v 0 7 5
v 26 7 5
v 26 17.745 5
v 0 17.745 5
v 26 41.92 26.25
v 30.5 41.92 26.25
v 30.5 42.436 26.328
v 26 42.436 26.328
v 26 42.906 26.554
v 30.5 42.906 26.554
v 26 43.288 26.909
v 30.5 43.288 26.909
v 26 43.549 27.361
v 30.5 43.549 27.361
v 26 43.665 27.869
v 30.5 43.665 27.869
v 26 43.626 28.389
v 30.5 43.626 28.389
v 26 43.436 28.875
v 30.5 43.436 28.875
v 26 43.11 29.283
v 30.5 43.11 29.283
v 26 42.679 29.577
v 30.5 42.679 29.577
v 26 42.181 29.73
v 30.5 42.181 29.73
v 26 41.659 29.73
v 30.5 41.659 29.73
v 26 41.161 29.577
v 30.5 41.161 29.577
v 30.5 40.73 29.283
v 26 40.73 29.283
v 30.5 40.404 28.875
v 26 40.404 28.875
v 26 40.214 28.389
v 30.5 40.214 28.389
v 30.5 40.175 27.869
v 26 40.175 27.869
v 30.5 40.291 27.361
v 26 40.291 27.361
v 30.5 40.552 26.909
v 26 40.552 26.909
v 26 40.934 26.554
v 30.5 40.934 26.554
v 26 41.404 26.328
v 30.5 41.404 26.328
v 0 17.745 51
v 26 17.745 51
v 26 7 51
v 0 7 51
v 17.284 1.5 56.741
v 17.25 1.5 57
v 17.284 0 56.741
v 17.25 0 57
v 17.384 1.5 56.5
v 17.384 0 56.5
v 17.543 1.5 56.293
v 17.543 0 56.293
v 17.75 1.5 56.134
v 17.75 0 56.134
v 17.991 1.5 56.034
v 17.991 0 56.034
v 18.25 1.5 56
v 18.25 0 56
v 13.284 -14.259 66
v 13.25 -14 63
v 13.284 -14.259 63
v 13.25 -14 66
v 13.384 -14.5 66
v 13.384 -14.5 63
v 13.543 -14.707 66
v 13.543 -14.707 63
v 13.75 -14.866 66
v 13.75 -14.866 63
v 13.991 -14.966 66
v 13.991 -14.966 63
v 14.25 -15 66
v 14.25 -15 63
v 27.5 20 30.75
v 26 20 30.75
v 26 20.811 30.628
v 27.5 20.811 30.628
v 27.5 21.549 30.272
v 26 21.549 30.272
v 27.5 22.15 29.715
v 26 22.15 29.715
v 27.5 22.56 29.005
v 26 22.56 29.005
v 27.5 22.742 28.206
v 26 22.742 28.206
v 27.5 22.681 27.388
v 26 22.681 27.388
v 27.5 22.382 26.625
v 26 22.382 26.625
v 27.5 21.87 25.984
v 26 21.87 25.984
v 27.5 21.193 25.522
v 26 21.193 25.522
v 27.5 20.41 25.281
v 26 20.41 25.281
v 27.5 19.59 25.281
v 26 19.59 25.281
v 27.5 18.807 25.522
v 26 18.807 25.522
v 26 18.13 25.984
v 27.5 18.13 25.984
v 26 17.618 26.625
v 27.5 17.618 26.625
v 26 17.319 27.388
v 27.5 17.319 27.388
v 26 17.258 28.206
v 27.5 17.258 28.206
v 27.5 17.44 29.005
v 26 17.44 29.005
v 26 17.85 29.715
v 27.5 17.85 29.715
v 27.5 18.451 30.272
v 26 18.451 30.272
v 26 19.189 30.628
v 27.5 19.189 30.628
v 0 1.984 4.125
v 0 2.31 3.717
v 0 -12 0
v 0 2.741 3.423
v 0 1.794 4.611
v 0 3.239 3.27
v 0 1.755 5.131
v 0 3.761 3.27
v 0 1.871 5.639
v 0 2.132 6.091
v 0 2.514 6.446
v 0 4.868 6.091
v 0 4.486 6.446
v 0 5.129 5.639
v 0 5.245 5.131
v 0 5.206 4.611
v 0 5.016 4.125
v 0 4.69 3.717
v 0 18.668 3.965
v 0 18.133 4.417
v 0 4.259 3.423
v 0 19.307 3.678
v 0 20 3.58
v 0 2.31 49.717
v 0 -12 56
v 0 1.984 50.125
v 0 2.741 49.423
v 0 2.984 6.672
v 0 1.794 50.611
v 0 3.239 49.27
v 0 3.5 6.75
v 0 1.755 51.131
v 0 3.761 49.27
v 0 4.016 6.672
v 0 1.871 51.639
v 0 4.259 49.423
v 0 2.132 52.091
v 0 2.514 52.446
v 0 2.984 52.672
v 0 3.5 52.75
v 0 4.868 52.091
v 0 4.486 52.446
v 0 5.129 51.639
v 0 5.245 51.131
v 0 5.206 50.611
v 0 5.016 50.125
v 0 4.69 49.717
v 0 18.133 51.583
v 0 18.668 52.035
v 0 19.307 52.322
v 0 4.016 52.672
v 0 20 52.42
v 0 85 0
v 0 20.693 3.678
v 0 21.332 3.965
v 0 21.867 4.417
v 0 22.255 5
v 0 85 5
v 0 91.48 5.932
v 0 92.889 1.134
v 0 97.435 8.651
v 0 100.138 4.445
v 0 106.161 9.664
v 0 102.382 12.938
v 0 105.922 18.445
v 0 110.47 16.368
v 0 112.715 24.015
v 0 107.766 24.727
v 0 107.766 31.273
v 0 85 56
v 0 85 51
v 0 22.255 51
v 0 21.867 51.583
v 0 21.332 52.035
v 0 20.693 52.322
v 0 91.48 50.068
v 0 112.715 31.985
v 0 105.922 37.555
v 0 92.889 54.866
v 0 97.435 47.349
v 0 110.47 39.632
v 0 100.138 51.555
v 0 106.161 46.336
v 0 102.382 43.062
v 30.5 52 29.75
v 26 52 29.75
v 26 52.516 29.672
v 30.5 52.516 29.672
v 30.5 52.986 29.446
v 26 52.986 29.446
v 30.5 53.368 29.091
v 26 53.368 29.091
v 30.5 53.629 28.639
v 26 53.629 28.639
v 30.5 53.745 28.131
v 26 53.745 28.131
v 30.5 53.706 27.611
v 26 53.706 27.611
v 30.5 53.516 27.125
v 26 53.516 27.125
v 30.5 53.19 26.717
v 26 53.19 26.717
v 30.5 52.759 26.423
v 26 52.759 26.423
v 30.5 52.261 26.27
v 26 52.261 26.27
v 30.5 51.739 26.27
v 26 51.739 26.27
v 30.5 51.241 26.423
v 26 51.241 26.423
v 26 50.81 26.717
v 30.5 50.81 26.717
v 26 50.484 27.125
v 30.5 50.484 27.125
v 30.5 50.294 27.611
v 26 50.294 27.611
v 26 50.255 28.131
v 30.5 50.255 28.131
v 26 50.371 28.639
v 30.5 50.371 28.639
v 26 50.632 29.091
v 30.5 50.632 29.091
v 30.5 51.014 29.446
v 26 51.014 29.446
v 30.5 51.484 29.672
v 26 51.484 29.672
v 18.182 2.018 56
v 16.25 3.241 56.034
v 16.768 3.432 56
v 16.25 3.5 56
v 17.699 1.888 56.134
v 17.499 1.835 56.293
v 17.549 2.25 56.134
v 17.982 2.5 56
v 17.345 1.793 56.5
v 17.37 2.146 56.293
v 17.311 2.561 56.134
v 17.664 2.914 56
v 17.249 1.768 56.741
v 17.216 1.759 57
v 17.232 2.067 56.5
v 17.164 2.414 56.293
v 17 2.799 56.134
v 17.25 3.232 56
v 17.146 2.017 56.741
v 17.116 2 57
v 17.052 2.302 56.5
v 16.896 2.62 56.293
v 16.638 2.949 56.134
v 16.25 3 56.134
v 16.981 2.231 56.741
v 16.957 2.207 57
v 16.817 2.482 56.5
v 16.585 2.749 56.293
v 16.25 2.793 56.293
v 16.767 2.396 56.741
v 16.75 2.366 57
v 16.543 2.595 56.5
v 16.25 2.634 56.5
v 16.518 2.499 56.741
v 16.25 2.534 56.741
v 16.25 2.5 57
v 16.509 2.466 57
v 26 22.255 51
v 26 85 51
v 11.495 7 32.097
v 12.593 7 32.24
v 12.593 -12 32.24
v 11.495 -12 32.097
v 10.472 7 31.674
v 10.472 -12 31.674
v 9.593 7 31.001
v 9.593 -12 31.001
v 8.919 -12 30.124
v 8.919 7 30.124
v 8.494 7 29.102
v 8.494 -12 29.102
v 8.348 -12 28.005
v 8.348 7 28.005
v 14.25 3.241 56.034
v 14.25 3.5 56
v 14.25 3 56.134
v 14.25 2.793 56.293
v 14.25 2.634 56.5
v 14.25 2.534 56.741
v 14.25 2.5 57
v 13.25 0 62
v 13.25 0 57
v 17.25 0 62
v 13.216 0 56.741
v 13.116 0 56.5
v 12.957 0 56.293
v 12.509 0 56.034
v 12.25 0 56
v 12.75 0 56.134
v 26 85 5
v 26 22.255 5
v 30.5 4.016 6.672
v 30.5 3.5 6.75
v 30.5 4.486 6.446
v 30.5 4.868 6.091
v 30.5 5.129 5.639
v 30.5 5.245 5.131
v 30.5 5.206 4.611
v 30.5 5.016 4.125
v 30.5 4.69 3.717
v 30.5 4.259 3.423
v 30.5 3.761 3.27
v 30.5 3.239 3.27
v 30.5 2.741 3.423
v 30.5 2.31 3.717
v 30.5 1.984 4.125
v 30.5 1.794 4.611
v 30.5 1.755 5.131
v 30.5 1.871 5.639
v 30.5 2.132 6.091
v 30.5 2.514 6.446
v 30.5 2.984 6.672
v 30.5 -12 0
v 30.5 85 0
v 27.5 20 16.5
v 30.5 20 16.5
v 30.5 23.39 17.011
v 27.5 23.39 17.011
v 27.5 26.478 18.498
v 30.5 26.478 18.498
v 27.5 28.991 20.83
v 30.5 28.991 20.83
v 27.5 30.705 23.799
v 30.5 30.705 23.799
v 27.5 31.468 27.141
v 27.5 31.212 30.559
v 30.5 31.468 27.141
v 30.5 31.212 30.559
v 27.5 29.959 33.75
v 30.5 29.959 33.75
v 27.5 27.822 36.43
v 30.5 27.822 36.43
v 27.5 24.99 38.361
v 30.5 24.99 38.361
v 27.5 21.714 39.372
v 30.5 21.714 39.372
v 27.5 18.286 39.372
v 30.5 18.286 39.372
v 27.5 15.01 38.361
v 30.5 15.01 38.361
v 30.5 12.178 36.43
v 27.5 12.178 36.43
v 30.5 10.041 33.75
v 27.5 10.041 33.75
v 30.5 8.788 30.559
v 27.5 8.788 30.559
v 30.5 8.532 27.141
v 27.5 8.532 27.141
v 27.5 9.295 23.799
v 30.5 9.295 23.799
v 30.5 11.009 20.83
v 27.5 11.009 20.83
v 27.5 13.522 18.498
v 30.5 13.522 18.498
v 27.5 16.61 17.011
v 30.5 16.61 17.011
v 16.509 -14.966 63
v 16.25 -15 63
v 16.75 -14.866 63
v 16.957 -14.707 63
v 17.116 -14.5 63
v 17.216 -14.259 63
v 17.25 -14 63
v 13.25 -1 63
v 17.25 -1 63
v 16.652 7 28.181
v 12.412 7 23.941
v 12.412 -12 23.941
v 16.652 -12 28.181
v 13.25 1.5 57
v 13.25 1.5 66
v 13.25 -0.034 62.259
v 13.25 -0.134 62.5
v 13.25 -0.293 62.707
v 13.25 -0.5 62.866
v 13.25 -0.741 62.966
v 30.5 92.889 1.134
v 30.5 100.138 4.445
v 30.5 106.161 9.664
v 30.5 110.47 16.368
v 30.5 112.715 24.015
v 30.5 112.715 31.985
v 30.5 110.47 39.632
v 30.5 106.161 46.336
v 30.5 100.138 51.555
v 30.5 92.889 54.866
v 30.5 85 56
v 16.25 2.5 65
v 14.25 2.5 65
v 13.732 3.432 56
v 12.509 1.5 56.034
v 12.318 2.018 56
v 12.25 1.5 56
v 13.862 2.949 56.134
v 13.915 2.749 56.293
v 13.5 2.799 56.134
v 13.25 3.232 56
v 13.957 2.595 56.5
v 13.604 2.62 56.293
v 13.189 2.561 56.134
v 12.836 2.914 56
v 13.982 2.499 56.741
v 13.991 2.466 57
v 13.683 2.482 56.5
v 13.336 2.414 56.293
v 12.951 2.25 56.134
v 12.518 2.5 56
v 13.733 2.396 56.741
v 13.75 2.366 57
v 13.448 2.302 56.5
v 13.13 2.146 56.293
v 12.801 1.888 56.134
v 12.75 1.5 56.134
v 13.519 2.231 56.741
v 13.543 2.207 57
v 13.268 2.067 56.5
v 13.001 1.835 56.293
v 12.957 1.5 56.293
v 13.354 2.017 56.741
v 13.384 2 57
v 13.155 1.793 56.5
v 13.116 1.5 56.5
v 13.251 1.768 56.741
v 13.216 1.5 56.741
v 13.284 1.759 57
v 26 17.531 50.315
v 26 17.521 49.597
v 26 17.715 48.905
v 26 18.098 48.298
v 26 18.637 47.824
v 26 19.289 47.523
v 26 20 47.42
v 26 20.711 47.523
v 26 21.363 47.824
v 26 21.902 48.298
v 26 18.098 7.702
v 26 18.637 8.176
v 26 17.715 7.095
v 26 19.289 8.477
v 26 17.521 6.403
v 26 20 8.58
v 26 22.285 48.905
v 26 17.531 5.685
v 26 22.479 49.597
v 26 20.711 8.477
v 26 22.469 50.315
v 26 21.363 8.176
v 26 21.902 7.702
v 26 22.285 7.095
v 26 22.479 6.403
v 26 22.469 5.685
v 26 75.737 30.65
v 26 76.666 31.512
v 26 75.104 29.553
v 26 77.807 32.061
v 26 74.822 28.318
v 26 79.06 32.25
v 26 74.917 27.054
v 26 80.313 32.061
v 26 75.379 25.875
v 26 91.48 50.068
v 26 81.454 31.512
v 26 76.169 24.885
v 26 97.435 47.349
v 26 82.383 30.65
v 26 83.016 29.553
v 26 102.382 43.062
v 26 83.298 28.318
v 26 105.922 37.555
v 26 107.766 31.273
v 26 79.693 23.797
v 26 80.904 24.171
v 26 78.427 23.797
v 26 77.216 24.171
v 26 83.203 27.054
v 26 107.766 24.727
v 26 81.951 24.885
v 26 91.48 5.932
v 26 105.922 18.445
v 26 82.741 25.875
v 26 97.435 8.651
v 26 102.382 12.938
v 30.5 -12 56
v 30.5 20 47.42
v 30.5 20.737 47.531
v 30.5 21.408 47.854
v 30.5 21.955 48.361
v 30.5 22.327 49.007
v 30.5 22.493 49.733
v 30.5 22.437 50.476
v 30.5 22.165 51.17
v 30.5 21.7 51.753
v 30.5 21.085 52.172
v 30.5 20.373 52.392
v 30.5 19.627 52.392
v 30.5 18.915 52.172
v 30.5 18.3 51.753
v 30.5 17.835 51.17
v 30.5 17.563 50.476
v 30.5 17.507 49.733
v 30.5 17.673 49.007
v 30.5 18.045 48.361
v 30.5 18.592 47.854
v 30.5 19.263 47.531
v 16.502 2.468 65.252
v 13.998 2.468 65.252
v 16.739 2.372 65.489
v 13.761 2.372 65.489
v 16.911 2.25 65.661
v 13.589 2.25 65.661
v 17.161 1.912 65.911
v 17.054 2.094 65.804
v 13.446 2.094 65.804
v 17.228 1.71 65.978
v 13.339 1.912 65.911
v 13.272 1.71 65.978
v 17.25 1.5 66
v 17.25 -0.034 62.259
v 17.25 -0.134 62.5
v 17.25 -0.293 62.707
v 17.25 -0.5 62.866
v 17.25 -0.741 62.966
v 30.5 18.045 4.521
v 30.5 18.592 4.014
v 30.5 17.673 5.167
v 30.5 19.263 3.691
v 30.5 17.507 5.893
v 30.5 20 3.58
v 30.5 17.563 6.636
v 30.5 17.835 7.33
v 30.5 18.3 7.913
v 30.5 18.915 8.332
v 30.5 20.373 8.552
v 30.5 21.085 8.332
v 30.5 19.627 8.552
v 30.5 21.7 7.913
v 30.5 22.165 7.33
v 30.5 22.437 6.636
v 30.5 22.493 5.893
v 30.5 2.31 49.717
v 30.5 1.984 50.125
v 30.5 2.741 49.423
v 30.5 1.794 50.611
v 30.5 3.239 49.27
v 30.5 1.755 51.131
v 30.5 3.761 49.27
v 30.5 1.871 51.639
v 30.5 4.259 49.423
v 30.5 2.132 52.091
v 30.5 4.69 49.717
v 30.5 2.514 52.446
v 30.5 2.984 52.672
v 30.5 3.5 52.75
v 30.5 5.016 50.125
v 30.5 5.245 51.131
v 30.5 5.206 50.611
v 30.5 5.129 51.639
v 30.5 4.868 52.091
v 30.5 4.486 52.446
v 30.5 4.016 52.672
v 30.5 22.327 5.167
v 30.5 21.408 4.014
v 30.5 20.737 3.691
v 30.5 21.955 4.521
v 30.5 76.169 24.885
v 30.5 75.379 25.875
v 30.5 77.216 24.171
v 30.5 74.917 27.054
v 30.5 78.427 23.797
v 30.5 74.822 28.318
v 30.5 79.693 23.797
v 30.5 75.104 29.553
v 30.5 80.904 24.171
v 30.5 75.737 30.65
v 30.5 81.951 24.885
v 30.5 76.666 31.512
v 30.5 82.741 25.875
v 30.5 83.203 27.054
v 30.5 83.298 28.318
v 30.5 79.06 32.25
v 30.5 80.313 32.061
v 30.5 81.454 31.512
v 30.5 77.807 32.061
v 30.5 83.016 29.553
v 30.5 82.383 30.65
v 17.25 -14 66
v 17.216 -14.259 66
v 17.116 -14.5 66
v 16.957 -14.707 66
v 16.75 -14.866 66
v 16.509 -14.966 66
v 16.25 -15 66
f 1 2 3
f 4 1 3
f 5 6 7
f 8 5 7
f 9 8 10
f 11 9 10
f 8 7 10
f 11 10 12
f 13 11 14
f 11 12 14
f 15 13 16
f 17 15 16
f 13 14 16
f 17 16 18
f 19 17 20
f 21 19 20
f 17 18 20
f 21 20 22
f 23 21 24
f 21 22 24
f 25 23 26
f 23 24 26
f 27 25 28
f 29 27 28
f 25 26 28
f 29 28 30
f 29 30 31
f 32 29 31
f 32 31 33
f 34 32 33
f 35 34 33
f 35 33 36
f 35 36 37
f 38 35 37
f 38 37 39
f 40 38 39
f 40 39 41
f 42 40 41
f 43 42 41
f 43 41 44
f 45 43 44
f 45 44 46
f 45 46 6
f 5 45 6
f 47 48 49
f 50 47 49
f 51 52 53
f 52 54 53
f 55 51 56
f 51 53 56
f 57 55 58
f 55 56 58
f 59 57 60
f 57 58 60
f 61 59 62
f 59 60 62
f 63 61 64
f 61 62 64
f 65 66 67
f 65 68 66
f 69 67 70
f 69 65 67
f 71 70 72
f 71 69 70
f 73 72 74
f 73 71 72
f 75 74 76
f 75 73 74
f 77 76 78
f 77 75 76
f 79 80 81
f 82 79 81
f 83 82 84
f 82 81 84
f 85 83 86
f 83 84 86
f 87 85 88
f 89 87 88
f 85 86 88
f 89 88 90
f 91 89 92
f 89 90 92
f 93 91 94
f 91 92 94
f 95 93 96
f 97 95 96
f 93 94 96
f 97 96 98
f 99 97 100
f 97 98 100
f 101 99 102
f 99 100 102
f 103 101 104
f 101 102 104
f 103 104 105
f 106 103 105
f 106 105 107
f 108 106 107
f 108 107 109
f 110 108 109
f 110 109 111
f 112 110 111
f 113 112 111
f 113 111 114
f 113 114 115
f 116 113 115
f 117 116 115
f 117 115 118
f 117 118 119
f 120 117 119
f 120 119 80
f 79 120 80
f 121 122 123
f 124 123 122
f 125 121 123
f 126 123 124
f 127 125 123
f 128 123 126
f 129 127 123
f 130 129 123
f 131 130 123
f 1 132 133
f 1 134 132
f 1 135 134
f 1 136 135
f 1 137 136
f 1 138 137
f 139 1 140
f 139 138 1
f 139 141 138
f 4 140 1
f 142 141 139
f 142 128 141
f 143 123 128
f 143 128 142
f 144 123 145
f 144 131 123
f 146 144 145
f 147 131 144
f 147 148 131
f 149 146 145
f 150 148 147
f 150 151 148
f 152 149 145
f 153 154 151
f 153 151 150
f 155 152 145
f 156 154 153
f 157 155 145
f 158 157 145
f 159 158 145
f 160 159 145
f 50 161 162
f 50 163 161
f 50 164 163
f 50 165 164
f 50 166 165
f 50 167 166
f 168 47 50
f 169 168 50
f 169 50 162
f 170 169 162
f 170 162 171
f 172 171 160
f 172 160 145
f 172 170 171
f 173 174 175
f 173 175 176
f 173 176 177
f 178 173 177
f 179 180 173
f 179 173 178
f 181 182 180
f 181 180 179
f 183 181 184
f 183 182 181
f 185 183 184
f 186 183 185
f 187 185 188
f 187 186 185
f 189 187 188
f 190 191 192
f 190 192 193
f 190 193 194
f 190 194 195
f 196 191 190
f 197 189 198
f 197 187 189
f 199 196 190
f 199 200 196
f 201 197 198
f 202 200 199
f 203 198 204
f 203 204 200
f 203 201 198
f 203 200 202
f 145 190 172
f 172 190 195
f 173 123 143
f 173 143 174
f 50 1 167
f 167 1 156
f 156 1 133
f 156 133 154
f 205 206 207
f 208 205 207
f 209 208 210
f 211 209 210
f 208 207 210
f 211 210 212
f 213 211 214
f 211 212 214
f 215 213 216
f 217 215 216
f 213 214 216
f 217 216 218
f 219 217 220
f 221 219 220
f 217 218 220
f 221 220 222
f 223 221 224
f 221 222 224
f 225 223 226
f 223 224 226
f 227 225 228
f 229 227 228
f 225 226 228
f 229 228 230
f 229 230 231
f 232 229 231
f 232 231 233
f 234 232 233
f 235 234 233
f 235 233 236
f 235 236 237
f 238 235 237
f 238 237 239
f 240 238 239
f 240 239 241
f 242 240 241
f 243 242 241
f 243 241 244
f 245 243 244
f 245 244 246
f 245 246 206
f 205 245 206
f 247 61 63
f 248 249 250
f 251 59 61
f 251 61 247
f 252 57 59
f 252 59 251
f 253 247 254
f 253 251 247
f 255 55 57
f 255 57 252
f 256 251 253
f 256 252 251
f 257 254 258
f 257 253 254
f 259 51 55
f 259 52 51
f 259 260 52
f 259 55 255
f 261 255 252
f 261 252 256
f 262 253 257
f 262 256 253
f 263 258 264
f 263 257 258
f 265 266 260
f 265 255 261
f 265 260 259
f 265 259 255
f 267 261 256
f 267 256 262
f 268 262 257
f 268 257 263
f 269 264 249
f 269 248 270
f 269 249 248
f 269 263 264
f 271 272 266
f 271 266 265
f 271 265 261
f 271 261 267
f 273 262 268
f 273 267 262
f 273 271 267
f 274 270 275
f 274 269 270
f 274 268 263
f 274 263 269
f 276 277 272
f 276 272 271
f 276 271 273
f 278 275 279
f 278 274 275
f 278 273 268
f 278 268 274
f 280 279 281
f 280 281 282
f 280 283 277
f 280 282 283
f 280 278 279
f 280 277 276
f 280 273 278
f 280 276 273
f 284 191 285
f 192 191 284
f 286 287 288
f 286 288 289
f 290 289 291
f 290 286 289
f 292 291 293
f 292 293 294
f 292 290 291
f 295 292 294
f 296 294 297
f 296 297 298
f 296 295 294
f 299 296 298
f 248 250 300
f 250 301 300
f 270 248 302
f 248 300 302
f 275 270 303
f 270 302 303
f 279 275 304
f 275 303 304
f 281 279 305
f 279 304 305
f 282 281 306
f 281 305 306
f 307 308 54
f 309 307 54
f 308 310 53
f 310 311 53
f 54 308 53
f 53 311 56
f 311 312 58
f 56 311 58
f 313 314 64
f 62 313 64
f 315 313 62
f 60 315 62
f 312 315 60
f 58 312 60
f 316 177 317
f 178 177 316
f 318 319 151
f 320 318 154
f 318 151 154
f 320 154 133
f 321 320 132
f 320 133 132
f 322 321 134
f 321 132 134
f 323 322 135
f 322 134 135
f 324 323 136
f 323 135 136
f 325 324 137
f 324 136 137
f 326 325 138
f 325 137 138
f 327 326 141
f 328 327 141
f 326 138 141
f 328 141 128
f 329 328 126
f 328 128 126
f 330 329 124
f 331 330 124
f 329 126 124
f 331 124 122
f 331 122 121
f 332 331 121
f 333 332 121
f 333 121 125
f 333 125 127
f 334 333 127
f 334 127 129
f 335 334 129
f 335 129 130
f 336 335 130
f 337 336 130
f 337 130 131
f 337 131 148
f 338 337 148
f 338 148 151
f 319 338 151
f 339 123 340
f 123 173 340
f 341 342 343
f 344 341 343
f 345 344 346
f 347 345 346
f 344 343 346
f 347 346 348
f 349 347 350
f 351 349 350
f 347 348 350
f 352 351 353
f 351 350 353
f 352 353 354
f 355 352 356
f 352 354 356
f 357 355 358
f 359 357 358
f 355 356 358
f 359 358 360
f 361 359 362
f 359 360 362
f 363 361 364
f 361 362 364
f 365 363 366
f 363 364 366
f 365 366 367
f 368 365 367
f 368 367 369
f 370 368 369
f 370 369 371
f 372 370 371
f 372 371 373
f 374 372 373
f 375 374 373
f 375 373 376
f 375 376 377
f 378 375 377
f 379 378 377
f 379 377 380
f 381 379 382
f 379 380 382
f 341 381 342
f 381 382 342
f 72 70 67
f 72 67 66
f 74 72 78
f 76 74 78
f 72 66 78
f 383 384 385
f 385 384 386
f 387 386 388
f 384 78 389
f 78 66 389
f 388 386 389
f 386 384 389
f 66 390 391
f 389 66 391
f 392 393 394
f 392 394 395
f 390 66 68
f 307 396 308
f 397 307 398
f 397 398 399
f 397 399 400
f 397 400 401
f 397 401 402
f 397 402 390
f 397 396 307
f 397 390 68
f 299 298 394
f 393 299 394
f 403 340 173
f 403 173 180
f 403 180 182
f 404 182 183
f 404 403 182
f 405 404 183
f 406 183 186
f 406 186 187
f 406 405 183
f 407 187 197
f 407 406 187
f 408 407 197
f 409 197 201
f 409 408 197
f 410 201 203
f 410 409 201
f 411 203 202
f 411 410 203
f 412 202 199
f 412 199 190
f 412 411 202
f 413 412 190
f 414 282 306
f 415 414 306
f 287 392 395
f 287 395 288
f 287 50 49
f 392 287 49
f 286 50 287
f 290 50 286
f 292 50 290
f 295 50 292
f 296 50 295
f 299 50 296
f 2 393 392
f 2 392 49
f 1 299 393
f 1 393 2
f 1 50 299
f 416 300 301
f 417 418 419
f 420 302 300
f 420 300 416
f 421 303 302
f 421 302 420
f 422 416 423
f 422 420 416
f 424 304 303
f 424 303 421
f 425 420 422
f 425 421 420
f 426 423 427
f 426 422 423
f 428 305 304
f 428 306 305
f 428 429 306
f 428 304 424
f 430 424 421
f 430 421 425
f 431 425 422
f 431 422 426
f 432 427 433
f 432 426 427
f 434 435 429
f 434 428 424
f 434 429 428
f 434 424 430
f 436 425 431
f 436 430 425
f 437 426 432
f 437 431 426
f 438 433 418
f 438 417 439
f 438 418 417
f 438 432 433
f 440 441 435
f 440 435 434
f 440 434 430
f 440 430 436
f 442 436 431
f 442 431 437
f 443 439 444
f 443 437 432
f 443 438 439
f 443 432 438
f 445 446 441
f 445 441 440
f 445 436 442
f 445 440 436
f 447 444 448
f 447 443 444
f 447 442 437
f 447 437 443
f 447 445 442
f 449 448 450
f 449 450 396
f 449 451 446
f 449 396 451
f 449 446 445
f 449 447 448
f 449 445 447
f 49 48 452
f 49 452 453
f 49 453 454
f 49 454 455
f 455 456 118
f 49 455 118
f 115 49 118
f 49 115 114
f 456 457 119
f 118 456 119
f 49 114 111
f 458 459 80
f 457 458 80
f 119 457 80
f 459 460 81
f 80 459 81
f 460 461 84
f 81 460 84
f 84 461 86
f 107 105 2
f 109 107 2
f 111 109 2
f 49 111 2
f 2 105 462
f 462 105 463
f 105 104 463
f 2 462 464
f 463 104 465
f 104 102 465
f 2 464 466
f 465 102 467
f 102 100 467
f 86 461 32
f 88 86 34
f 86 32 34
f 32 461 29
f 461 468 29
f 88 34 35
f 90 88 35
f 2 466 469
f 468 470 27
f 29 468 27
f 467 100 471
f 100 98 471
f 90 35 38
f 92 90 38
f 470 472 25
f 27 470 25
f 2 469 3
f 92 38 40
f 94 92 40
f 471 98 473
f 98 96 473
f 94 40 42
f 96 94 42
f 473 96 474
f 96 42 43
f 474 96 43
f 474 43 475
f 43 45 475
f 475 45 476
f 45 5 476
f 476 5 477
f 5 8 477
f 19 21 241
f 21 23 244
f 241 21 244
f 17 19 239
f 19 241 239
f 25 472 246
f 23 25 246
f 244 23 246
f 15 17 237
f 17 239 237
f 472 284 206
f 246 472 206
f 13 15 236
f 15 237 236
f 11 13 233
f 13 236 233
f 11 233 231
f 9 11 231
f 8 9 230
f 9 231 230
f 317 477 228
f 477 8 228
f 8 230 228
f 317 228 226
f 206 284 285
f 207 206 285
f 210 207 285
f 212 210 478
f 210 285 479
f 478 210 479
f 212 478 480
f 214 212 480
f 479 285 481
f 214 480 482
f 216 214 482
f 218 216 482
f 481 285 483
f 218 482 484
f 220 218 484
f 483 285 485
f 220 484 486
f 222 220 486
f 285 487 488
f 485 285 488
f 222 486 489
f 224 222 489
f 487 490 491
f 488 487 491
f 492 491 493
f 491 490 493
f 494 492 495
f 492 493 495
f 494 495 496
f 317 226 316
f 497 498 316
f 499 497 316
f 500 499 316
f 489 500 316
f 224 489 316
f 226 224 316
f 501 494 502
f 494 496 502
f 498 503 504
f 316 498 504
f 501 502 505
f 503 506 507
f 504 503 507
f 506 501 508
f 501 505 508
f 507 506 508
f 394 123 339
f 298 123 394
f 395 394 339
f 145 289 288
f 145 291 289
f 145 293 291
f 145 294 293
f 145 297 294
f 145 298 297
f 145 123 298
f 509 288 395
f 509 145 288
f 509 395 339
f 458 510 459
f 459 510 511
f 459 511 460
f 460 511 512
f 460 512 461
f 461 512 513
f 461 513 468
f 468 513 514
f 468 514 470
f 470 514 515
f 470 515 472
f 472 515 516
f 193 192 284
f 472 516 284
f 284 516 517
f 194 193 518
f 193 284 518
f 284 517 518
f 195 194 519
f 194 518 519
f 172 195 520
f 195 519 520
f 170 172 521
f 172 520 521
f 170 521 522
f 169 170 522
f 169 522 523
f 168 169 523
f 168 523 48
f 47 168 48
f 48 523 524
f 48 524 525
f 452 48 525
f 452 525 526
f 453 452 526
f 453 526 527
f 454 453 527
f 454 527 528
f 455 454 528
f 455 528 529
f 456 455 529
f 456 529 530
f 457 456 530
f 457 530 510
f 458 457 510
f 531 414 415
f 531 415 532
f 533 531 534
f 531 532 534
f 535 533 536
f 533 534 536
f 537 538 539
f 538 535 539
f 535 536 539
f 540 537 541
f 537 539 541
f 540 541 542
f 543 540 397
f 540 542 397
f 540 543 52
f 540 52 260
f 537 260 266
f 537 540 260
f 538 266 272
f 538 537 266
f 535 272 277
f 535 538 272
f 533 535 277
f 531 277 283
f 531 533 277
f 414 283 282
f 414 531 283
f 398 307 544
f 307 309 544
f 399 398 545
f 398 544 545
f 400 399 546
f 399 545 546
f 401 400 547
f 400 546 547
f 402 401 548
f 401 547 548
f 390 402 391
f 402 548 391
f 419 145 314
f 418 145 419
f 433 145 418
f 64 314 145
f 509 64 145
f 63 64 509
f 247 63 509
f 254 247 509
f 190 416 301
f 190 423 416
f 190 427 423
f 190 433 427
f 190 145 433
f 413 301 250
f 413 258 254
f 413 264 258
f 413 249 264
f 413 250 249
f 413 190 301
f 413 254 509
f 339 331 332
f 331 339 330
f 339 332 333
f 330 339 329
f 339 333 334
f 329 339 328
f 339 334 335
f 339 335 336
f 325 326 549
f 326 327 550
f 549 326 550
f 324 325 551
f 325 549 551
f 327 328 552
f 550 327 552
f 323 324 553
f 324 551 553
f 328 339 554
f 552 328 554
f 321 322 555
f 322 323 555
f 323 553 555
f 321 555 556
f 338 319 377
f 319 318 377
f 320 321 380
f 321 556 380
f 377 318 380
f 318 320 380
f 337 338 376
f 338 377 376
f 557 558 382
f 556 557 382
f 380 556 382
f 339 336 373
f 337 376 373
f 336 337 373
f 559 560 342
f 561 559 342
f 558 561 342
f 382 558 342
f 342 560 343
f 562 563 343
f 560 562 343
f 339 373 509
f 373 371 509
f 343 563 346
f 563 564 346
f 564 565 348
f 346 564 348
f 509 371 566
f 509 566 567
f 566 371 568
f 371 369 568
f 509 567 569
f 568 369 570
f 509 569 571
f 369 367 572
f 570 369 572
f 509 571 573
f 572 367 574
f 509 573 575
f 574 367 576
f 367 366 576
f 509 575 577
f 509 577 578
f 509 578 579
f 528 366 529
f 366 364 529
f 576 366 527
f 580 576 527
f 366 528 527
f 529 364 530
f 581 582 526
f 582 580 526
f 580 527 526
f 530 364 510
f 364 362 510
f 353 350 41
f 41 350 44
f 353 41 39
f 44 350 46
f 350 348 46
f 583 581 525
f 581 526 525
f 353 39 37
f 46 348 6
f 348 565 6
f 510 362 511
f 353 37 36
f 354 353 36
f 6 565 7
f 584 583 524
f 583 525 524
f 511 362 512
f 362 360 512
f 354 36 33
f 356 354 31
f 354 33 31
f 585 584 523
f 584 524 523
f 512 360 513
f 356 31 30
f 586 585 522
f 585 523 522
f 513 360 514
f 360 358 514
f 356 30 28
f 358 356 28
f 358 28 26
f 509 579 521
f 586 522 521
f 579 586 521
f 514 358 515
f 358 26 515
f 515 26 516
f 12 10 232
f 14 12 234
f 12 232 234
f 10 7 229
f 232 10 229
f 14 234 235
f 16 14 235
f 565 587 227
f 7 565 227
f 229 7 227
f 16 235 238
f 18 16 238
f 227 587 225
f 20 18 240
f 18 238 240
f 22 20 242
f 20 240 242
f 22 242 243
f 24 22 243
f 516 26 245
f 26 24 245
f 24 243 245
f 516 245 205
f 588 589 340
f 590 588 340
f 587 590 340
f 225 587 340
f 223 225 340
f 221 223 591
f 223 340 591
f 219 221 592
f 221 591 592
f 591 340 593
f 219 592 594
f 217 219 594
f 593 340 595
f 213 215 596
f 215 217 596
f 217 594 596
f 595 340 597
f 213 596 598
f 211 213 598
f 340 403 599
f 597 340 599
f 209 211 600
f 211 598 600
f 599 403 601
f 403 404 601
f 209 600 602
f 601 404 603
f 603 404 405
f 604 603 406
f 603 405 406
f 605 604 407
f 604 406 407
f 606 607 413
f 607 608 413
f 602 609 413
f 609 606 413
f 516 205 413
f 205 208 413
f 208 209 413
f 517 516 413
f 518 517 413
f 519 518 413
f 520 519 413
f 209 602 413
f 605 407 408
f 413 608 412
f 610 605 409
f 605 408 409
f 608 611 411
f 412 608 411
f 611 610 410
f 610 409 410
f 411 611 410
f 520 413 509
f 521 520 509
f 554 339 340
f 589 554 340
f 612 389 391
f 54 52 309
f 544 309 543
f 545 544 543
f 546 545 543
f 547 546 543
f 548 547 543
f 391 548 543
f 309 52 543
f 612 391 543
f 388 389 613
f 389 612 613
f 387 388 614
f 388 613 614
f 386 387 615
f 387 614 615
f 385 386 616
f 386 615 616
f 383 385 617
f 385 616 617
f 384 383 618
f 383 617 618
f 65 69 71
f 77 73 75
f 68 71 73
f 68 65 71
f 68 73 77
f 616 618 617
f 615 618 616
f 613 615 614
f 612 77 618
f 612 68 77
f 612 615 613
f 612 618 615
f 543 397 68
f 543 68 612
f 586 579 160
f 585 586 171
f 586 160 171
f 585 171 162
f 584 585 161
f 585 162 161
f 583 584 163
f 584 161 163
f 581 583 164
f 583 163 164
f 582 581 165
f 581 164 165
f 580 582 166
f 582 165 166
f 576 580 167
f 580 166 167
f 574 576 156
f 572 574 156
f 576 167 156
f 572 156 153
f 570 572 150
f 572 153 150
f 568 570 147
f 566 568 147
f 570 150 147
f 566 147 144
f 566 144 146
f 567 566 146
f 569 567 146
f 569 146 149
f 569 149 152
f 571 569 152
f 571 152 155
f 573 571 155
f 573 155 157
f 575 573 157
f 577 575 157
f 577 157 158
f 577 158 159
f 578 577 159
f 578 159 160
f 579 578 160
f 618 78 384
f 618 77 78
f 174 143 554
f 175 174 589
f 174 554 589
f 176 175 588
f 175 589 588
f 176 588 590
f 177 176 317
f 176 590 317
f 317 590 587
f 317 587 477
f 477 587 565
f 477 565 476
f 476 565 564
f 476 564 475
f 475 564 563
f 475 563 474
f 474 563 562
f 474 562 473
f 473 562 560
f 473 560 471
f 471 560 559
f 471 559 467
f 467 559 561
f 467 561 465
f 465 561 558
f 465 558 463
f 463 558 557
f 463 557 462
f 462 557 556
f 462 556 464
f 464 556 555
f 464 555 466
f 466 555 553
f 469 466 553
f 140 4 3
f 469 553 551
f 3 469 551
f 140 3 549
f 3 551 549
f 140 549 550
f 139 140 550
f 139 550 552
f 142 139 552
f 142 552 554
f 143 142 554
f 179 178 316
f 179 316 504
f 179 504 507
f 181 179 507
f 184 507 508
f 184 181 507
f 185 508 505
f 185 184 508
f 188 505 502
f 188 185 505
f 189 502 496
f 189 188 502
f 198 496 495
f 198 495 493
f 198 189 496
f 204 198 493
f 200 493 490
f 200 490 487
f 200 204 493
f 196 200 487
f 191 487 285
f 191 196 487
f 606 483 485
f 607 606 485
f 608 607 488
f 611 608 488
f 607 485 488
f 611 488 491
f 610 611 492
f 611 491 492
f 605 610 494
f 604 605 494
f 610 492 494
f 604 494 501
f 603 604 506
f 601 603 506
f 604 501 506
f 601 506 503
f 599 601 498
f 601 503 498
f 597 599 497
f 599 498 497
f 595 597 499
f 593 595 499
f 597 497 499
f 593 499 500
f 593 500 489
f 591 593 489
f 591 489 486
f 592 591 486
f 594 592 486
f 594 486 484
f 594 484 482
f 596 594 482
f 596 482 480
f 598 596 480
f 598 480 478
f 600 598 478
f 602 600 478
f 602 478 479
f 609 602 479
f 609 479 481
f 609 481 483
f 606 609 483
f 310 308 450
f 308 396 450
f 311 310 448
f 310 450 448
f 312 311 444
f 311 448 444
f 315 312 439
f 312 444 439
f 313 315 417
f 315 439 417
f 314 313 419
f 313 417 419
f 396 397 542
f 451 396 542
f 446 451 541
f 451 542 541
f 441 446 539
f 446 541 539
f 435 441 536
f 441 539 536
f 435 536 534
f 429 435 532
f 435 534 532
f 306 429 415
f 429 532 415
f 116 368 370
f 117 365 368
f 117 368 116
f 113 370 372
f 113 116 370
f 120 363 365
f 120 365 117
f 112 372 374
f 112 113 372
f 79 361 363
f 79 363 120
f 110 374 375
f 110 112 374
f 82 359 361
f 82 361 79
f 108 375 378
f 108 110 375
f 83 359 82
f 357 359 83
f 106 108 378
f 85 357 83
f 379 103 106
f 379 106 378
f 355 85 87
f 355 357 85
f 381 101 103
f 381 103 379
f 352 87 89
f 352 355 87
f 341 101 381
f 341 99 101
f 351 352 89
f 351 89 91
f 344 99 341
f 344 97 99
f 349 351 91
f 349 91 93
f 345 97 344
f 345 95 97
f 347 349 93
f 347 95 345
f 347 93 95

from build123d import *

# Parameters (mm, degrees)
SKETCH2_W           = 30.5
SKETCH2_H           = 56
BOSS_EXTRUDE3_DEPTH = 85
BOSS_EXTRUDE4_DEPTH = 30.5
CUT_EXTRUDE2_DEPTH  = 26
SKETCH5_R           = 2.75
SKETCH5_R_2         = 4.25
SKETCH5_R_3         = 1.75
CUT_EXTRUDE3_DEPTH  = 10
SKETCH7_R           = 11.5
CUT_EXTRUDE5_DEPTH  = 3
SKETCH9_R           = 1.75
CUT_EXTRUDE7_DEPTH  = 77
SKETCH6_R           = 2.5
SKETCH6_R_2         = 1.75
CUT_EXTRUDE8_DEPTH  = 77
BOSS_EXTRUDE5_DEPTH = 10
SKETCH12_W          = 4
SKETCH12_H          = 3
BOSS_EXTRUDE6_DEPTH = 15
FILLET2_R           = 1
SKETCH13_W          = 30.5
SKETCH13_H          = 56
BOSS_EXTRUDE7_DEPTH = 12
CUT_EXTRUDE9_DEPTH  = 22


with BuildPart() as part:
    # Sketch2 → Boss-Extrude3 (new body)
    with BuildSketch(Plane(origin=(0, 0, 0), x_dir=(1, 0, 0), z_dir=(0, 1, 0))):
        with Locations((15.25, -28)):
            Rectangle(SKETCH2_W, SKETCH2_H)
    extrude(amount=BOSS_EXTRUDE3_DEPTH)

    # Sketch4 → Boss-Extrude4 (add)
    with BuildSketch(Plane(origin=(30.5, 0, 0), x_dir=(0, 0, -1), z_dir=(1, 0, 0))):
        with BuildLine():
            Line((-56, 85), (0, 85))
            ThreePointArc((0, 85), (-28, 113), (-56, 85))
        make_face()
    extrude(amount=-BOSS_EXTRUDE4_DEPTH)

    # Sketch3 → Cut-Extrude2 (cut)
    with BuildSketch(Plane.ZY):
        with BuildLine():
            Line((5, 10), (5, 80))
            Line((5, 80), (5, 85))
            ThreePointArc((5, 85), (28, 108), (51, 85))
            Line((51, 85), (51, 80))
            Line((51, 80), (51, 10))
            Line((51, 10), (51, 7))
            Line((51, 7), (5, 7))
            Line((5, 7), (5, 10))
        make_face()
    extrude(amount=-CUT_EXTRUDE2_DEPTH, mode=Mode.SUBTRACT)

    # Sketch5 → Cut-Extrude3 (cut)
    with BuildSketch(Plane.ZY.offset(-26)):
        with Locations((28, 20)):
            Circle(SKETCH5_R)
        with Locations((28, 79.06)):
            Circle(SKETCH5_R_2)
        with Locations((28, 52)):
            Circle(SKETCH5_R_3)
    extrude(amount=-CUT_EXTRUDE3_DEPTH, mode=Mode.SUBTRACT)

    # Sketch7 → Cut-Extrude5 (cut)
    with BuildSketch(Plane(origin=(30.5, 0, 0), x_dir=(0, 0, -1), z_dir=(1, 0, 0))):
        with Locations((-28, 20)):
            Circle(SKETCH7_R)
    extrude(amount=-CUT_EXTRUDE5_DEPTH, mode=Mode.SUBTRACT)

    # Sketch9 → Cut-Extrude7 (cut)
    with BuildSketch(Plane.ZY):
        with Locations((5, 3.5)):
            Circle(SKETCH9_R)
        with Locations((51, 3.5)):
            Circle(SKETCH9_R)
    extrude(amount=-CUT_EXTRUDE7_DEPTH, mode=Mode.SUBTRACT)

    # Sketch6 → Cut-Extrude8 (cut)
    with BuildSketch(Plane(origin=(30.5, 0, 0), x_dir=(0, 0, -1), z_dir=(1, 0, 0))):
        with Locations((-49.92, 20)):
            Circle(SKETCH6_R)
        with Locations((-6.08, 20)):
            Circle(SKETCH6_R)
        with Locations((-28, 41.92)):
            Circle(SKETCH6_R_2)
    extrude(amount=-CUT_EXTRUDE8_DEPTH, mode=Mode.SUBTRACT)

    # Sketch11 → Boss-Extrude5 (add)
    with BuildSketch(Plane.XY.offset(56)):
        Polygon((15.25, 2.5), (17.25, 2.5), (17.25, 0), (15.25, 0), (13.25, 0), (13.25, 2.5), align=None)
    extrude(amount=BOSS_EXTRUDE5_DEPTH)

    # Sketch12 → Boss-Extrude6 (add)
    with BuildSketch(Plane.XZ):
        with Locations((15.25, 64.5)):
            Rectangle(SKETCH12_W, SKETCH12_H)
    extrude(amount=BOSS_EXTRUDE6_DEPTH)

    # Fillet2
    fillet2_edges = [part.edges().sort_by_distance(p)[0] for p in [
        (17.25, 1.25, 56),
        (15.25, 2.5, 56),
        (17.25, 2.5, 61),
        (13.25, 1.25, 56),
        (13.25, 2.5, 61),
        (15.25, 2.5, 66),
        (15.25, 0, 63),
        (13.25, -15, 64.5),
        (17.25, -15, 64.5),
    ]]
    fillet(fillet2_edges, radius=FILLET2_R)

    # Sketch13 → Boss-Extrude7 (add)
    with BuildSketch(Plane.XZ):
        with Locations((15.25, 28)):
            Rectangle(SKETCH13_W, SKETCH13_H)
        with BuildLine():
            Line((8.34810103, 28.004718314), (12.411901595, 23.940917749))
            Line((12.411901595, 23.940917749), (16.65189897, 28.180915124))
            Line((16.65189897, 28.180915124), (12.592816719, 32.239997375))
            ThreePointArc((12.592816719, 32.239997375), (9.593303861, 31.001467248), (8.34810103, 28.004718314))
        make_face(mode=Mode.SUBTRACT)
    extrude(amount=BOSS_EXTRUDE7_DEPTH)

    # Sketch15 → Cut-Extrude9 (cut)
    with BuildSketch(Plane.XZ.offset(12)):
        with BuildLine():
            Line((8.34810103, 28.004718314), (12.411901595, 23.940917749))
            Line((12.411901595, 23.940917749), (16.65189897, 28.180915124))
            Line((16.65189897, 28.180915124), (12.592816719, 32.239997375))
            ThreePointArc((12.592816719, 32.239997375), (9.593303861, 31.001467248), (8.34810103, 28.004718314))
        make_face()
    extrude(amount=-CUT_EXTRUDE9_DEPTH, mode=Mode.SUBTRACT)


solid = part.part
